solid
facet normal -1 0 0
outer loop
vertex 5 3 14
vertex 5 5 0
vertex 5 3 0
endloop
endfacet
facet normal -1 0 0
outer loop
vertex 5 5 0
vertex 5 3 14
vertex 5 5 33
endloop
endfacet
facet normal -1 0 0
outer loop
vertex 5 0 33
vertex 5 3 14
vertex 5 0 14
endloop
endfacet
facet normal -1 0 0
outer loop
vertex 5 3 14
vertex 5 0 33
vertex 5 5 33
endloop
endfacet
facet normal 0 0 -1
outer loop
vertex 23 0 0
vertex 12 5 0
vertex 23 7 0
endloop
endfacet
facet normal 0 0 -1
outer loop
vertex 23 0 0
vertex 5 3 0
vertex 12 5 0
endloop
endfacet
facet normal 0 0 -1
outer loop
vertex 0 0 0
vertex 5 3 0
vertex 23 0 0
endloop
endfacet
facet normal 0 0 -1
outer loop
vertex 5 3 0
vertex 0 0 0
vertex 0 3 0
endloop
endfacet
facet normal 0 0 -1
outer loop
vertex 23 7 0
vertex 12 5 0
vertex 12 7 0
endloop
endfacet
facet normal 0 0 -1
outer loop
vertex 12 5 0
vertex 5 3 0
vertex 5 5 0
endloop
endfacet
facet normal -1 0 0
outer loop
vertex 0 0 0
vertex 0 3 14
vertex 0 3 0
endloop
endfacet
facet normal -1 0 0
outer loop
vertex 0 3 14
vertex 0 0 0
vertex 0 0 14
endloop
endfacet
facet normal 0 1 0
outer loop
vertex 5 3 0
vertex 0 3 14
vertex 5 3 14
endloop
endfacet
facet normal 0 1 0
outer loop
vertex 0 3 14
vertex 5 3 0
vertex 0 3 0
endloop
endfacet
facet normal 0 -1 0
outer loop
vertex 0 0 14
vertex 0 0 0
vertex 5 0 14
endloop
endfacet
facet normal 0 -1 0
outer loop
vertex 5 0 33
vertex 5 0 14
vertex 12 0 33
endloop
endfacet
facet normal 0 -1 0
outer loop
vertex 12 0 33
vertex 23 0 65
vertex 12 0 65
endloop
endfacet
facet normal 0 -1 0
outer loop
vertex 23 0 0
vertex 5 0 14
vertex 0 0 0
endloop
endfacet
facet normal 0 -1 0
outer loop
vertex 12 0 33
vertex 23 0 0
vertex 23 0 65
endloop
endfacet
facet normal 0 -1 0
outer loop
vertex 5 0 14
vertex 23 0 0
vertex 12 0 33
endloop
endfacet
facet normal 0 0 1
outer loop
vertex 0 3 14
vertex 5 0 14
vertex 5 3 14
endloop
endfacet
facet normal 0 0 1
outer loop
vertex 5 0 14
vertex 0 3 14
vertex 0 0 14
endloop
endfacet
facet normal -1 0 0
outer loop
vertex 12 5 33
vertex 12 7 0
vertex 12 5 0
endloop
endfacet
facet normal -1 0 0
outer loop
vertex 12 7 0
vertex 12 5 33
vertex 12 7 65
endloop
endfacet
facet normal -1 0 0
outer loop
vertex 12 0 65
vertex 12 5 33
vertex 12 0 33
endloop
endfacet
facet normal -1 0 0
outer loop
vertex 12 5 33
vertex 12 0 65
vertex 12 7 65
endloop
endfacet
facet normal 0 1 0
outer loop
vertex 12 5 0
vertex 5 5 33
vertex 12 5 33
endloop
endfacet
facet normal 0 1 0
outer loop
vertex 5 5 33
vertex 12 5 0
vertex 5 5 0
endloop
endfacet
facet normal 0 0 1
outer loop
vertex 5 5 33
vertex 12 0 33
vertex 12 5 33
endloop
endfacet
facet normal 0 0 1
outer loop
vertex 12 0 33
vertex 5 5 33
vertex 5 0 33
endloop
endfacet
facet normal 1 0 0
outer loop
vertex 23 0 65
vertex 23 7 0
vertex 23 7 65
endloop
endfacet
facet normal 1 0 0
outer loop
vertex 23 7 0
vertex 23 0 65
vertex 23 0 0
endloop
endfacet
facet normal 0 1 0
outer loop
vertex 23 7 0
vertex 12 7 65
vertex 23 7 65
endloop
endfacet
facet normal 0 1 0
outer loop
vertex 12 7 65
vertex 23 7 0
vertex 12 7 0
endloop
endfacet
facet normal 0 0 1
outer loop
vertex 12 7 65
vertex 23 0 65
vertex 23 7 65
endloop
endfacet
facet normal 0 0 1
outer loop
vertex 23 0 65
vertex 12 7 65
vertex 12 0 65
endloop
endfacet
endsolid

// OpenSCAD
translate([2.5, 1.5, 1.0]) color([0.23941596018595857, 0.6373994011293003, 0.37864807032309444]) cube([5, 3, 2], center=true);
translate([2.5, 1.5, 3.0]) color([0.8754233917130172, 0.5681514209101919, 0.4144063966836443]) cube([5, 3, 2], center=true);
translate([2.5, 1.5, 5.0]) color([0.40226707511907955, 0.7018296239336754, 0.41822655329246605]) cube([5, 3, 2], center=true);
translate([2.5, 1.5, 7.0]) color([0.6621958889738174, 0.04677968595679827, 0.44535218971882984]) cube([5, 3, 2], center=true);
translate([2.5, 1.5, 9.0]) color([0.25922692344722276, 0.15768657212231085, 0.5275731301676146]) cube([5, 3, 2], center=true);
translate([2.5, 1.5, 11.0]) color([0.48726560106903205, 0.5614049256144269, 0.7554847672586825]) cube([5, 3, 2], center=true);
translate([2.5, 1.5, 13.0]) color([0.8838751542487009, 0.4945826703752868, 0.31205824641687296]) cube([5, 3, 2], center=true);
translate([8.5, 2.5, 1.5]) color([0.46689223535252355, 0.8090458573603624, 0.8750163314802711]) cube([7, 5, 3], center=true);
translate([8.5, 2.5, 4.5]) color([0.8124149323637591, 0.188001294050828, 0.9994203594553304]) cube([7, 5, 3], center=true);
translate([8.5, 2.5, 7.5]) color([0.6330887599183004, 0.08346705017572931, 0.7255543554613124]) cube([7, 5, 3], center=true);
translate([8.5, 2.5, 10.5]) color([0.9868214802051282, 0.40181682221254356, 0.6785150052419683]) cube([7, 5, 3], center=true);
translate([8.5, 2.5, 13.5]) color([0.31617713722134233, 0.2135246620646961, 0.7173241433110372]) cube([7, 5, 3], center=true);
translate([8.5, 2.5, 16.5]) color([0.0023575647193538884, 0.8227314105314157, 0.5283459768597928]) cube([7, 5, 3], center=true);
translate([8.5, 2.5, 19.5]) color([0.09778434180065931, 0.11890389478474583, 0.6492654248961536]) cube([7, 5, 3], center=true);
translate([8.5, 2.5, 22.5]) color([0.8736538239003423, 0.27998274332687256, 0.9785151867733981]) cube([7, 5, 3], center=true);
translate([8.5, 2.5, 25.5]) color([0.10018068906370903, 0.8539381095973382, 0.39669617733090445]) cube([7, 5, 3], center=true);
translate([8.5, 2.5, 28.5]) color([0.08134541676823415, 0.2747138434192621, 0.4529781848179143]) cube([7, 5, 3], center=true);
translate([8.5, 2.5, 31.5]) color([0.7923415311856522, 0.8613599036372361, 0.13342055420254906]) cube([7, 5, 3], center=true);
translate([17.5, 3.5, 2.5]) color([0.5208655284141989, 0.6507832381497373, 0.3470530145996015]) cube([11, 7, 5], center=true);
translate([17.5, 3.5, 7.5]) color([0.8718638357105861, 0.27840981521636055, 0.01857432754559518]) cube([11, 7, 5], center=true);
translate([17.5, 3.5, 12.5]) color([0.0406632736752609, 0.6809967701112433, 0.5583557360970469]) cube([11, 7, 5], center=true);
translate([17.5, 3.5, 17.5]) color([0.946502554169996, 0.9384387997349186, 0.9098511774051025]) cube([11, 7, 5], center=true);
translate([17.5, 3.5, 22.5]) color([0.04200453196734122, 0.7491348233908631, 0.7013248175948597]) cube([11, 7, 5], center=true);
translate([17.5, 3.5, 27.5]) color([0.6553618646747296, 0.7123576525162417, 0.9027101506193307]) cube([11, 7, 5], center=true);
translate([17.5, 3.5, 32.5]) color([0.6401411997932241, 0.372449262972256, 0.5379287837318205]) cube([11, 7, 5], center=true);
translate([17.5, 3.5, 37.5]) color([0.20784410369082473, 0.5871255046951435, 0.008897082049078797]) cube([11, 7, 5], center=true);
translate([17.5, 3.5, 42.5]) color([0.15102317386398778, 0.3334083880298664, 0.7896231589257826]) cube([11, 7, 5], center=true);
translate([17.5, 3.5, 47.5]) color([0.7184994227715396, 0.3382559700266786, 0.6205381083165517]) cube([11, 7, 5], center=true);
translate([17.5, 3.5, 52.5]) color([0.041202949506209285, 0.16386054567557595, 0.9819140701253054]) cube([11, 7, 5], center=true);
translate([17.5, 3.5, 57.5]) color([0.28953085363586695, 0.39479198298829066, 0.5484842965725134]) cube([11, 7, 5], center=true);
translate([17.5, 3.5, 62.5]) color([0.29340700145733656, 0.47806466915102097, 0.2397060836386239]) cube([11, 7, 5], center=true);
